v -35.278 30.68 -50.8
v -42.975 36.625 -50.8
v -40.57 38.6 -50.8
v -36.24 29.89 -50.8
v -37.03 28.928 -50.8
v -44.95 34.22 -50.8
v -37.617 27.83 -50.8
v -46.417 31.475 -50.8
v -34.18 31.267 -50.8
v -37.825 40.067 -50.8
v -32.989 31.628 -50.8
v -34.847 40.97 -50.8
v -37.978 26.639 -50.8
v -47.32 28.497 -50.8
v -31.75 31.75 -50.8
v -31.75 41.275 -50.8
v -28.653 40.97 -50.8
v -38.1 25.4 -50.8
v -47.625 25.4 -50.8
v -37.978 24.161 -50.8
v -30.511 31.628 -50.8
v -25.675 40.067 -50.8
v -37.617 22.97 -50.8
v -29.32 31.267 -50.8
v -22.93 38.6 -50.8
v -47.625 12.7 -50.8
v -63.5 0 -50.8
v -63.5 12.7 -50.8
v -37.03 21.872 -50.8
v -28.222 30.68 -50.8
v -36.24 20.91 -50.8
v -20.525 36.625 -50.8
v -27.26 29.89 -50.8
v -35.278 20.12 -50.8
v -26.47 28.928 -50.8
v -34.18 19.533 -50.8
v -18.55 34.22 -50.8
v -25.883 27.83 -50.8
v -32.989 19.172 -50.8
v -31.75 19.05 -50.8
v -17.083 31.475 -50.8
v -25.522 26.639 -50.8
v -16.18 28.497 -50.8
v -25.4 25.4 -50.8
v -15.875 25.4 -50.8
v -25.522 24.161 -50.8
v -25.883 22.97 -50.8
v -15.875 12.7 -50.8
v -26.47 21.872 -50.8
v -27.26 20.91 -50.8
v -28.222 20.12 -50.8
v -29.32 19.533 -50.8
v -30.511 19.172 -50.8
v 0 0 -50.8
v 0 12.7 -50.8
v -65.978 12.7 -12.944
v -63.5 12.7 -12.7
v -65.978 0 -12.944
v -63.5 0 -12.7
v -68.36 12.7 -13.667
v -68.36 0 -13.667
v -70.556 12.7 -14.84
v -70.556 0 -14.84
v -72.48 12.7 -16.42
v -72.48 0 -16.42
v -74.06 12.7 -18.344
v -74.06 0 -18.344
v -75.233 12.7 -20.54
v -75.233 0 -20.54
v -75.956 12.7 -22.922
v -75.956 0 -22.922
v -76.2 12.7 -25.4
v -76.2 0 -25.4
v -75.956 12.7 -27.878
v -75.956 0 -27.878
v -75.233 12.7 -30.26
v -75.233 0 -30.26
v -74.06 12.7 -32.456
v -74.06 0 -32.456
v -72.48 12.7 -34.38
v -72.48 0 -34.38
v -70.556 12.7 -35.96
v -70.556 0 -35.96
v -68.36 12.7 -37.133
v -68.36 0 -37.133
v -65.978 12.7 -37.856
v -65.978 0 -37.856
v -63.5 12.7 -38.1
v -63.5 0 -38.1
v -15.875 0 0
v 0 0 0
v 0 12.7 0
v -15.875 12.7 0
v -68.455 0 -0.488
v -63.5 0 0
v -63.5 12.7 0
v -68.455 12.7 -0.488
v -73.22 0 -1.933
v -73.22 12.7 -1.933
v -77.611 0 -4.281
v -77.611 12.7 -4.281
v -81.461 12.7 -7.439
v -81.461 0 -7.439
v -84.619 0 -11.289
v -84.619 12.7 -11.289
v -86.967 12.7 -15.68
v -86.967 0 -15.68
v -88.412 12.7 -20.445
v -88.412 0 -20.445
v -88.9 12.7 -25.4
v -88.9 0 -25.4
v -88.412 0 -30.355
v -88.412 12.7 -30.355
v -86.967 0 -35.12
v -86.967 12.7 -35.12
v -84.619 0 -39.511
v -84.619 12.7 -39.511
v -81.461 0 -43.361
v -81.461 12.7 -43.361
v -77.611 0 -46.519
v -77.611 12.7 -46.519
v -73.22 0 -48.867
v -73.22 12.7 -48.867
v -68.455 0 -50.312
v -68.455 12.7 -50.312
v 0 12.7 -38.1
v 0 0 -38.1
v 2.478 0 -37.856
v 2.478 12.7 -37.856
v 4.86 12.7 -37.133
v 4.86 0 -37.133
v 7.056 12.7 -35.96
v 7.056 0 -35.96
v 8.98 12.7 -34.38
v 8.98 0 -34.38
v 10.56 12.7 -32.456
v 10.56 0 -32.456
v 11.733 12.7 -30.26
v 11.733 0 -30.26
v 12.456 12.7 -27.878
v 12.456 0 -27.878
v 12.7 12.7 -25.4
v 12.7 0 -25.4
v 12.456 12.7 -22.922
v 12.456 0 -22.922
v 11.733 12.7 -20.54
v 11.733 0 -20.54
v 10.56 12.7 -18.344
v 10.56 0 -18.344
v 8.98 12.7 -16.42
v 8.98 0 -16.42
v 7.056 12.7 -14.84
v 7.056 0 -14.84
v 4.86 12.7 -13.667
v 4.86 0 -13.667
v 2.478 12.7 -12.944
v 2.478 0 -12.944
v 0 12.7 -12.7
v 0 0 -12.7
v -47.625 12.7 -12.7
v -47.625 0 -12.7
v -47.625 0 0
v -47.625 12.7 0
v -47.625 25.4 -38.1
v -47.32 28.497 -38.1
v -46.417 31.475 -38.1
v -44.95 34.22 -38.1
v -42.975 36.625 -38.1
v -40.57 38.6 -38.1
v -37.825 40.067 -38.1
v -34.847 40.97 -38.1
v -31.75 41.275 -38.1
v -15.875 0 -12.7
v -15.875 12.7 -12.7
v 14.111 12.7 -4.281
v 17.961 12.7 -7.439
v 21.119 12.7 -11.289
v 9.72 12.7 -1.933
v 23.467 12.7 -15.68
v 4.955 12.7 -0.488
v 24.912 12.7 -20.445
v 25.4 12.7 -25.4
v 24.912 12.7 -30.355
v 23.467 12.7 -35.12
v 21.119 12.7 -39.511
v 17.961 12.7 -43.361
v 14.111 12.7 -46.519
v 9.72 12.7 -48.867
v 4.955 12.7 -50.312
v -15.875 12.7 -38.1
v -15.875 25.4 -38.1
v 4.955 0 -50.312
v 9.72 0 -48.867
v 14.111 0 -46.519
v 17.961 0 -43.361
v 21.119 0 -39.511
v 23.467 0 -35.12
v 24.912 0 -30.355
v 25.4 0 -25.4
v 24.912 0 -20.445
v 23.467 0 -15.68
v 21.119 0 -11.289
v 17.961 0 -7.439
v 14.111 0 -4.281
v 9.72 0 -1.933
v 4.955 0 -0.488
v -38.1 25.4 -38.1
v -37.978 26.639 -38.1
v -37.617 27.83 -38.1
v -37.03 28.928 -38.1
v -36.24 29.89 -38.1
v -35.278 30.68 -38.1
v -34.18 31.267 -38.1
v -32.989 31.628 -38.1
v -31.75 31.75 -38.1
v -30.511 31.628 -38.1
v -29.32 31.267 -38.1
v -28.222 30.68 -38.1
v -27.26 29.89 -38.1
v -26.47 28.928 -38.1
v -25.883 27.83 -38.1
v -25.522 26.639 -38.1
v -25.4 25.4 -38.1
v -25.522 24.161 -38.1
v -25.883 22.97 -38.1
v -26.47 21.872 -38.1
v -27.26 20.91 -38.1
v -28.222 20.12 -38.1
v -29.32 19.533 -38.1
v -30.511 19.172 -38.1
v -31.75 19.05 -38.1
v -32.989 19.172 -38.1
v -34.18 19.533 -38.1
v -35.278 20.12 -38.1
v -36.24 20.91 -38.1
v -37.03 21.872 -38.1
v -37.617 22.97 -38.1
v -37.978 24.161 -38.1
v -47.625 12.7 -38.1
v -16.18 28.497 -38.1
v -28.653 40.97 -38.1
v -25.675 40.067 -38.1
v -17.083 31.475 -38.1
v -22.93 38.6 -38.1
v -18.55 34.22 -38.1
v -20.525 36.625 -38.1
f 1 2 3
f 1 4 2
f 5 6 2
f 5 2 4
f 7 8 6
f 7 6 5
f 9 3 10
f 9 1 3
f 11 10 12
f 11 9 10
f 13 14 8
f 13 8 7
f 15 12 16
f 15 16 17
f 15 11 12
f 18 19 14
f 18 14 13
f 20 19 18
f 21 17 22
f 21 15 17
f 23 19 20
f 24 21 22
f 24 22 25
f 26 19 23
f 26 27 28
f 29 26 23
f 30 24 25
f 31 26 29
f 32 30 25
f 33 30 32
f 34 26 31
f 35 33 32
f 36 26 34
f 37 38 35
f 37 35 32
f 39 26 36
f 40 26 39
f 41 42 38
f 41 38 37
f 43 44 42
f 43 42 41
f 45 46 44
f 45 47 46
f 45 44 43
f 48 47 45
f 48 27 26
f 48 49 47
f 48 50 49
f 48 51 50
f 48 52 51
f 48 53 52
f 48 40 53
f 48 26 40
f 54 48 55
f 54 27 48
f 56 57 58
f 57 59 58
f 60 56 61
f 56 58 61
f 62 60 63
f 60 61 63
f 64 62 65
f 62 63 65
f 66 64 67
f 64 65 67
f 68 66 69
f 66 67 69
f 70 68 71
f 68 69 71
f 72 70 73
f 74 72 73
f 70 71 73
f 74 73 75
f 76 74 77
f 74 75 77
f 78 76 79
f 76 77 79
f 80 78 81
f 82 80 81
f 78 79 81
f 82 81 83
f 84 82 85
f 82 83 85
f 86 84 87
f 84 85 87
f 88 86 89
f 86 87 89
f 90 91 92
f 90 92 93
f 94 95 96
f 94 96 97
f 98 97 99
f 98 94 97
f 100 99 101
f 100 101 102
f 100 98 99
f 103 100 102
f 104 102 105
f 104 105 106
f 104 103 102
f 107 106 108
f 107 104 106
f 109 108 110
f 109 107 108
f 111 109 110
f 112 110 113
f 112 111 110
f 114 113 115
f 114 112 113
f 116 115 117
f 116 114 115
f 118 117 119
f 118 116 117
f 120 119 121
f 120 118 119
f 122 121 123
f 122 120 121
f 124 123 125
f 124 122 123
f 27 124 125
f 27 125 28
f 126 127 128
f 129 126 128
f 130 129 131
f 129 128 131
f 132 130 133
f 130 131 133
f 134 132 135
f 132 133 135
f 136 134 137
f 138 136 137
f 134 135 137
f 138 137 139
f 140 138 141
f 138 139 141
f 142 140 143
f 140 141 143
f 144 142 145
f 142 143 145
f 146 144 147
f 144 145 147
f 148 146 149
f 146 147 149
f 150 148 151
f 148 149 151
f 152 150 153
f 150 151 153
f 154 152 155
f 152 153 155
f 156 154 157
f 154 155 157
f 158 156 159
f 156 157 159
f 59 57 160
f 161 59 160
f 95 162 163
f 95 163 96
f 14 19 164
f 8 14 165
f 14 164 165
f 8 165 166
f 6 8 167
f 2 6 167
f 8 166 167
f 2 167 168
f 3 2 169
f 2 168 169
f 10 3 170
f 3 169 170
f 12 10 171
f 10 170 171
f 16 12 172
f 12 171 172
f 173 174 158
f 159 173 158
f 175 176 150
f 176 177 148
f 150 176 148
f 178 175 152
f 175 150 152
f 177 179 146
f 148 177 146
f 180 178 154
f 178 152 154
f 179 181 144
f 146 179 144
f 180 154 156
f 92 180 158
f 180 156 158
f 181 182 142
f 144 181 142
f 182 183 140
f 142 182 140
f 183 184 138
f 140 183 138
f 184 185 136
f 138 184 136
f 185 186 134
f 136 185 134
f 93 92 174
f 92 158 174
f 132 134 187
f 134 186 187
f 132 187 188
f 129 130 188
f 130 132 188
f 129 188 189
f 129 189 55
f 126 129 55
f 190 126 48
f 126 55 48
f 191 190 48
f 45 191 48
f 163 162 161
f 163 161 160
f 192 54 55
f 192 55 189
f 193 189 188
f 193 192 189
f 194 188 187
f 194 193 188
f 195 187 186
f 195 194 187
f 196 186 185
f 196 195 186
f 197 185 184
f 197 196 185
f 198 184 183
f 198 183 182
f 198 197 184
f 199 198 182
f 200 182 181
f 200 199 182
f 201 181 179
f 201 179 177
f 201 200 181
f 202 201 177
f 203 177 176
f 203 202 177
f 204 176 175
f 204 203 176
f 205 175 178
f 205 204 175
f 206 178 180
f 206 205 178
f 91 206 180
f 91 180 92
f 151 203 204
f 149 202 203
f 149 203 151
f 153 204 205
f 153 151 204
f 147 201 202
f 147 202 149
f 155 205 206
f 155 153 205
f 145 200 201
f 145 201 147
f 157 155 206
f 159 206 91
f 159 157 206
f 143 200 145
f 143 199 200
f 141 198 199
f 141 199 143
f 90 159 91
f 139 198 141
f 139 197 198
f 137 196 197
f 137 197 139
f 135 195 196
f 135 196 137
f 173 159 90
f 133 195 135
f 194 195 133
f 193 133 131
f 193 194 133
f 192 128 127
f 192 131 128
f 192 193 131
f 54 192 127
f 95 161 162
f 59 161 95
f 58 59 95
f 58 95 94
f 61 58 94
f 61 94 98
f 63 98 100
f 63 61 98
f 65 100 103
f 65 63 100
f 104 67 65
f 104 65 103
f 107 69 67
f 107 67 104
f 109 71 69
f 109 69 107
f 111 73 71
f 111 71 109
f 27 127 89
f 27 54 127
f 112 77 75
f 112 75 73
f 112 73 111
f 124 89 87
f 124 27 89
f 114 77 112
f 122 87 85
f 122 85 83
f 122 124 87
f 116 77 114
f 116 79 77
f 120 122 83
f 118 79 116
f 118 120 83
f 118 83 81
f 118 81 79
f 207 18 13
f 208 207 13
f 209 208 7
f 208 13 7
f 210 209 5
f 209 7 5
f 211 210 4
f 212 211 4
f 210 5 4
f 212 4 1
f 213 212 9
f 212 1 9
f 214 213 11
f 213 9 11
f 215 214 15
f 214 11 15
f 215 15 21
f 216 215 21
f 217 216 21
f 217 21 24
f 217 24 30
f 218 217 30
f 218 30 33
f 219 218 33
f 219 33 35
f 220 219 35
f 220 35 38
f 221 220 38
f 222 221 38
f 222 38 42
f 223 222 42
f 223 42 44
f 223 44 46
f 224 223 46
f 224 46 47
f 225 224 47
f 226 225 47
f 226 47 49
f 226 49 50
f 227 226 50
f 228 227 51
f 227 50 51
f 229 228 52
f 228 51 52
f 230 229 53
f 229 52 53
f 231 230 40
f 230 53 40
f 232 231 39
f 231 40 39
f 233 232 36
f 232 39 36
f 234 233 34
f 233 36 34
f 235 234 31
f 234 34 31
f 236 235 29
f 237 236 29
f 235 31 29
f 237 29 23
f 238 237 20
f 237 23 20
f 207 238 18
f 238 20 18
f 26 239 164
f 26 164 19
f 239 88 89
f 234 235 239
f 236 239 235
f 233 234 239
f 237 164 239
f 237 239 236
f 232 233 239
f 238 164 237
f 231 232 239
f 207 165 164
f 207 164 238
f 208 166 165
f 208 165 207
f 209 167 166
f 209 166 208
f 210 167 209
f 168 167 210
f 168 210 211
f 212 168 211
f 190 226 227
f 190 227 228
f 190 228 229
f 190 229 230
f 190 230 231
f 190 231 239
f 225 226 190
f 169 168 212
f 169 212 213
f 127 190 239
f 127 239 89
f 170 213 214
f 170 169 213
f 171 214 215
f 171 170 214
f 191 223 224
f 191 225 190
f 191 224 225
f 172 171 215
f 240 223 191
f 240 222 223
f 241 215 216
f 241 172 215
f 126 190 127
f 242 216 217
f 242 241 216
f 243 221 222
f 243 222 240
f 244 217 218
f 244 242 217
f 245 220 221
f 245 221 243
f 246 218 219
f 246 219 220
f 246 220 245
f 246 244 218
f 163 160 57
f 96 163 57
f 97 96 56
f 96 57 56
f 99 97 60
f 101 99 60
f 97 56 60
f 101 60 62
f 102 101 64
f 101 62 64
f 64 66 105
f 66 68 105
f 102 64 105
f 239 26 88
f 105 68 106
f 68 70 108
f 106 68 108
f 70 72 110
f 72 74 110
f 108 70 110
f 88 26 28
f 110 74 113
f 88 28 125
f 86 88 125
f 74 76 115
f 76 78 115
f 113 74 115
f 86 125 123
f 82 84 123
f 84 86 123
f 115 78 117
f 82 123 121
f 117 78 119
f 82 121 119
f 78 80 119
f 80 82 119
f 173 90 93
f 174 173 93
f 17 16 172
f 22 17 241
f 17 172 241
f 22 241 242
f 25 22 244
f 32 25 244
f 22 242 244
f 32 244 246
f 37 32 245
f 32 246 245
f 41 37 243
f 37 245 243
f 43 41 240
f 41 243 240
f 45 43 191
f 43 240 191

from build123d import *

# Parameters (mm, degrees)
BOSS_EXTRUDE2_DEPTH        = 12.7
F_1_1_DIAMETER_HOLE1_D     = 25.4
SKETCH6_W                  = 63.5
SKETCH6_H                  = 25.4
CUT_EXTRUDE1_DEPTH         = 12.7
SKETCH7_W                  = 31.75
SKETCH7_H                  = 12.7
CUT_EXTRUDE2_DEPTH         = 12.7
SKETCH8_W                  = 31.75
SKETCH8_H                  = 12.7
BOSS_EXTRUDE3_DEPTH        = 28.575
F_1_2_0_5_DIAMETER_HOLE1_D = 12.7
CUT_EXTRUDE4_DEPTH         = 12.7


with BuildPart() as part:
    # Sketch3 → Boss-Extrude2 (new body)
    with BuildSketch(Plane(origin=(0, 0, 0), x_dir=(1, 0, 0), z_dir=(0, 1, 0))):
        with BuildLine():
            Line((0, 0), (-63.5, 0))
            ThreePointArc((-63.5, 0), (-88.9, 25.4), (-63.5, 50.8))
            Line((-63.5, 50.8), (0, 50.8))
            ThreePointArc((0, 50.8), (25.4, 25.4), (0, 0))
        make_face()
    extrude(amount=BOSS_EXTRUDE2_DEPTH)

    # 1 (1) Diameter Hole1 (through all)
    with Locations(Plane(origin=(0, 12.7, 0), x_dir=(1, 0, 0), z_dir=(0, 1, 0))):
        with Locations((-63.5, 25.4), (0, 25.4)):
            Hole(F_1_1_DIAMETER_HOLE1_D / 2)

    # Sketch6 → Cut-Extrude1 (cut)
    with BuildSketch(Plane(origin=(0, 12.7, 0), x_dir=(1, 0, 0), z_dir=(0, 1, 0))):
        with Locations((-31.75, 25.4)):
            Rectangle(SKETCH6_W, SKETCH6_H)
    extrude(amount=-CUT_EXTRUDE1_DEPTH, mode=Mode.SUBTRACT)

    # Sketch7 → Cut-Extrude2 (cut)
    with BuildSketch(Plane.XY):
        with Locations((-31.75, 6.35)):
            Rectangle(SKETCH7_W, SKETCH7_H)
    extrude(amount=-CUT_EXTRUDE2_DEPTH, mode=Mode.SUBTRACT)

    # Sketch8 → Boss-Extrude3 (add)
    with BuildSketch(Plane(origin=(0, 12.7, 0), x_dir=(1, 0, 0), z_dir=(0, 1, 0))):
        with Locations((-31.75, 44.45)):
            Rectangle(SKETCH8_W, SKETCH8_H)
    extrude(amount=BOSS_EXTRUDE3_DEPTH)

    # 1/2 (0.5) Diameter Hole1 (through all)
    with Locations(Plane.XY.offset(-38.1)):
        with Locations((-31.75, 25.4)):
            Hole(F_1_2_0_5_DIAMETER_HOLE1_D / 2)

    # Sketch12 → Cut-Extrude4 (cut)
    with BuildSketch(Plane.XY.offset(-38.1)):
        with BuildLine():
            Line((-31.75, 41.275), (-47.625, 41.275))
            Line((-47.625, 41.275), (-47.625, 25.4))
            ThreePointArc((-47.625, 25.4), (-42.975320151, 36.625320151), (-31.75, 41.275))
        make_face()
        with BuildLine():
            Line((-15.875, 41.275), (-31.75, 41.275))
            ThreePointArc((-31.75, 41.275), (-20.524679849, 36.625320151), (-15.875, 25.4))
            Line((-15.875, 25.4), (-15.875, 41.275))
        make_face()
    extrude(amount=-CUT_EXTRUDE4_DEPTH, mode=Mode.SUBTRACT)


solid = part.part
